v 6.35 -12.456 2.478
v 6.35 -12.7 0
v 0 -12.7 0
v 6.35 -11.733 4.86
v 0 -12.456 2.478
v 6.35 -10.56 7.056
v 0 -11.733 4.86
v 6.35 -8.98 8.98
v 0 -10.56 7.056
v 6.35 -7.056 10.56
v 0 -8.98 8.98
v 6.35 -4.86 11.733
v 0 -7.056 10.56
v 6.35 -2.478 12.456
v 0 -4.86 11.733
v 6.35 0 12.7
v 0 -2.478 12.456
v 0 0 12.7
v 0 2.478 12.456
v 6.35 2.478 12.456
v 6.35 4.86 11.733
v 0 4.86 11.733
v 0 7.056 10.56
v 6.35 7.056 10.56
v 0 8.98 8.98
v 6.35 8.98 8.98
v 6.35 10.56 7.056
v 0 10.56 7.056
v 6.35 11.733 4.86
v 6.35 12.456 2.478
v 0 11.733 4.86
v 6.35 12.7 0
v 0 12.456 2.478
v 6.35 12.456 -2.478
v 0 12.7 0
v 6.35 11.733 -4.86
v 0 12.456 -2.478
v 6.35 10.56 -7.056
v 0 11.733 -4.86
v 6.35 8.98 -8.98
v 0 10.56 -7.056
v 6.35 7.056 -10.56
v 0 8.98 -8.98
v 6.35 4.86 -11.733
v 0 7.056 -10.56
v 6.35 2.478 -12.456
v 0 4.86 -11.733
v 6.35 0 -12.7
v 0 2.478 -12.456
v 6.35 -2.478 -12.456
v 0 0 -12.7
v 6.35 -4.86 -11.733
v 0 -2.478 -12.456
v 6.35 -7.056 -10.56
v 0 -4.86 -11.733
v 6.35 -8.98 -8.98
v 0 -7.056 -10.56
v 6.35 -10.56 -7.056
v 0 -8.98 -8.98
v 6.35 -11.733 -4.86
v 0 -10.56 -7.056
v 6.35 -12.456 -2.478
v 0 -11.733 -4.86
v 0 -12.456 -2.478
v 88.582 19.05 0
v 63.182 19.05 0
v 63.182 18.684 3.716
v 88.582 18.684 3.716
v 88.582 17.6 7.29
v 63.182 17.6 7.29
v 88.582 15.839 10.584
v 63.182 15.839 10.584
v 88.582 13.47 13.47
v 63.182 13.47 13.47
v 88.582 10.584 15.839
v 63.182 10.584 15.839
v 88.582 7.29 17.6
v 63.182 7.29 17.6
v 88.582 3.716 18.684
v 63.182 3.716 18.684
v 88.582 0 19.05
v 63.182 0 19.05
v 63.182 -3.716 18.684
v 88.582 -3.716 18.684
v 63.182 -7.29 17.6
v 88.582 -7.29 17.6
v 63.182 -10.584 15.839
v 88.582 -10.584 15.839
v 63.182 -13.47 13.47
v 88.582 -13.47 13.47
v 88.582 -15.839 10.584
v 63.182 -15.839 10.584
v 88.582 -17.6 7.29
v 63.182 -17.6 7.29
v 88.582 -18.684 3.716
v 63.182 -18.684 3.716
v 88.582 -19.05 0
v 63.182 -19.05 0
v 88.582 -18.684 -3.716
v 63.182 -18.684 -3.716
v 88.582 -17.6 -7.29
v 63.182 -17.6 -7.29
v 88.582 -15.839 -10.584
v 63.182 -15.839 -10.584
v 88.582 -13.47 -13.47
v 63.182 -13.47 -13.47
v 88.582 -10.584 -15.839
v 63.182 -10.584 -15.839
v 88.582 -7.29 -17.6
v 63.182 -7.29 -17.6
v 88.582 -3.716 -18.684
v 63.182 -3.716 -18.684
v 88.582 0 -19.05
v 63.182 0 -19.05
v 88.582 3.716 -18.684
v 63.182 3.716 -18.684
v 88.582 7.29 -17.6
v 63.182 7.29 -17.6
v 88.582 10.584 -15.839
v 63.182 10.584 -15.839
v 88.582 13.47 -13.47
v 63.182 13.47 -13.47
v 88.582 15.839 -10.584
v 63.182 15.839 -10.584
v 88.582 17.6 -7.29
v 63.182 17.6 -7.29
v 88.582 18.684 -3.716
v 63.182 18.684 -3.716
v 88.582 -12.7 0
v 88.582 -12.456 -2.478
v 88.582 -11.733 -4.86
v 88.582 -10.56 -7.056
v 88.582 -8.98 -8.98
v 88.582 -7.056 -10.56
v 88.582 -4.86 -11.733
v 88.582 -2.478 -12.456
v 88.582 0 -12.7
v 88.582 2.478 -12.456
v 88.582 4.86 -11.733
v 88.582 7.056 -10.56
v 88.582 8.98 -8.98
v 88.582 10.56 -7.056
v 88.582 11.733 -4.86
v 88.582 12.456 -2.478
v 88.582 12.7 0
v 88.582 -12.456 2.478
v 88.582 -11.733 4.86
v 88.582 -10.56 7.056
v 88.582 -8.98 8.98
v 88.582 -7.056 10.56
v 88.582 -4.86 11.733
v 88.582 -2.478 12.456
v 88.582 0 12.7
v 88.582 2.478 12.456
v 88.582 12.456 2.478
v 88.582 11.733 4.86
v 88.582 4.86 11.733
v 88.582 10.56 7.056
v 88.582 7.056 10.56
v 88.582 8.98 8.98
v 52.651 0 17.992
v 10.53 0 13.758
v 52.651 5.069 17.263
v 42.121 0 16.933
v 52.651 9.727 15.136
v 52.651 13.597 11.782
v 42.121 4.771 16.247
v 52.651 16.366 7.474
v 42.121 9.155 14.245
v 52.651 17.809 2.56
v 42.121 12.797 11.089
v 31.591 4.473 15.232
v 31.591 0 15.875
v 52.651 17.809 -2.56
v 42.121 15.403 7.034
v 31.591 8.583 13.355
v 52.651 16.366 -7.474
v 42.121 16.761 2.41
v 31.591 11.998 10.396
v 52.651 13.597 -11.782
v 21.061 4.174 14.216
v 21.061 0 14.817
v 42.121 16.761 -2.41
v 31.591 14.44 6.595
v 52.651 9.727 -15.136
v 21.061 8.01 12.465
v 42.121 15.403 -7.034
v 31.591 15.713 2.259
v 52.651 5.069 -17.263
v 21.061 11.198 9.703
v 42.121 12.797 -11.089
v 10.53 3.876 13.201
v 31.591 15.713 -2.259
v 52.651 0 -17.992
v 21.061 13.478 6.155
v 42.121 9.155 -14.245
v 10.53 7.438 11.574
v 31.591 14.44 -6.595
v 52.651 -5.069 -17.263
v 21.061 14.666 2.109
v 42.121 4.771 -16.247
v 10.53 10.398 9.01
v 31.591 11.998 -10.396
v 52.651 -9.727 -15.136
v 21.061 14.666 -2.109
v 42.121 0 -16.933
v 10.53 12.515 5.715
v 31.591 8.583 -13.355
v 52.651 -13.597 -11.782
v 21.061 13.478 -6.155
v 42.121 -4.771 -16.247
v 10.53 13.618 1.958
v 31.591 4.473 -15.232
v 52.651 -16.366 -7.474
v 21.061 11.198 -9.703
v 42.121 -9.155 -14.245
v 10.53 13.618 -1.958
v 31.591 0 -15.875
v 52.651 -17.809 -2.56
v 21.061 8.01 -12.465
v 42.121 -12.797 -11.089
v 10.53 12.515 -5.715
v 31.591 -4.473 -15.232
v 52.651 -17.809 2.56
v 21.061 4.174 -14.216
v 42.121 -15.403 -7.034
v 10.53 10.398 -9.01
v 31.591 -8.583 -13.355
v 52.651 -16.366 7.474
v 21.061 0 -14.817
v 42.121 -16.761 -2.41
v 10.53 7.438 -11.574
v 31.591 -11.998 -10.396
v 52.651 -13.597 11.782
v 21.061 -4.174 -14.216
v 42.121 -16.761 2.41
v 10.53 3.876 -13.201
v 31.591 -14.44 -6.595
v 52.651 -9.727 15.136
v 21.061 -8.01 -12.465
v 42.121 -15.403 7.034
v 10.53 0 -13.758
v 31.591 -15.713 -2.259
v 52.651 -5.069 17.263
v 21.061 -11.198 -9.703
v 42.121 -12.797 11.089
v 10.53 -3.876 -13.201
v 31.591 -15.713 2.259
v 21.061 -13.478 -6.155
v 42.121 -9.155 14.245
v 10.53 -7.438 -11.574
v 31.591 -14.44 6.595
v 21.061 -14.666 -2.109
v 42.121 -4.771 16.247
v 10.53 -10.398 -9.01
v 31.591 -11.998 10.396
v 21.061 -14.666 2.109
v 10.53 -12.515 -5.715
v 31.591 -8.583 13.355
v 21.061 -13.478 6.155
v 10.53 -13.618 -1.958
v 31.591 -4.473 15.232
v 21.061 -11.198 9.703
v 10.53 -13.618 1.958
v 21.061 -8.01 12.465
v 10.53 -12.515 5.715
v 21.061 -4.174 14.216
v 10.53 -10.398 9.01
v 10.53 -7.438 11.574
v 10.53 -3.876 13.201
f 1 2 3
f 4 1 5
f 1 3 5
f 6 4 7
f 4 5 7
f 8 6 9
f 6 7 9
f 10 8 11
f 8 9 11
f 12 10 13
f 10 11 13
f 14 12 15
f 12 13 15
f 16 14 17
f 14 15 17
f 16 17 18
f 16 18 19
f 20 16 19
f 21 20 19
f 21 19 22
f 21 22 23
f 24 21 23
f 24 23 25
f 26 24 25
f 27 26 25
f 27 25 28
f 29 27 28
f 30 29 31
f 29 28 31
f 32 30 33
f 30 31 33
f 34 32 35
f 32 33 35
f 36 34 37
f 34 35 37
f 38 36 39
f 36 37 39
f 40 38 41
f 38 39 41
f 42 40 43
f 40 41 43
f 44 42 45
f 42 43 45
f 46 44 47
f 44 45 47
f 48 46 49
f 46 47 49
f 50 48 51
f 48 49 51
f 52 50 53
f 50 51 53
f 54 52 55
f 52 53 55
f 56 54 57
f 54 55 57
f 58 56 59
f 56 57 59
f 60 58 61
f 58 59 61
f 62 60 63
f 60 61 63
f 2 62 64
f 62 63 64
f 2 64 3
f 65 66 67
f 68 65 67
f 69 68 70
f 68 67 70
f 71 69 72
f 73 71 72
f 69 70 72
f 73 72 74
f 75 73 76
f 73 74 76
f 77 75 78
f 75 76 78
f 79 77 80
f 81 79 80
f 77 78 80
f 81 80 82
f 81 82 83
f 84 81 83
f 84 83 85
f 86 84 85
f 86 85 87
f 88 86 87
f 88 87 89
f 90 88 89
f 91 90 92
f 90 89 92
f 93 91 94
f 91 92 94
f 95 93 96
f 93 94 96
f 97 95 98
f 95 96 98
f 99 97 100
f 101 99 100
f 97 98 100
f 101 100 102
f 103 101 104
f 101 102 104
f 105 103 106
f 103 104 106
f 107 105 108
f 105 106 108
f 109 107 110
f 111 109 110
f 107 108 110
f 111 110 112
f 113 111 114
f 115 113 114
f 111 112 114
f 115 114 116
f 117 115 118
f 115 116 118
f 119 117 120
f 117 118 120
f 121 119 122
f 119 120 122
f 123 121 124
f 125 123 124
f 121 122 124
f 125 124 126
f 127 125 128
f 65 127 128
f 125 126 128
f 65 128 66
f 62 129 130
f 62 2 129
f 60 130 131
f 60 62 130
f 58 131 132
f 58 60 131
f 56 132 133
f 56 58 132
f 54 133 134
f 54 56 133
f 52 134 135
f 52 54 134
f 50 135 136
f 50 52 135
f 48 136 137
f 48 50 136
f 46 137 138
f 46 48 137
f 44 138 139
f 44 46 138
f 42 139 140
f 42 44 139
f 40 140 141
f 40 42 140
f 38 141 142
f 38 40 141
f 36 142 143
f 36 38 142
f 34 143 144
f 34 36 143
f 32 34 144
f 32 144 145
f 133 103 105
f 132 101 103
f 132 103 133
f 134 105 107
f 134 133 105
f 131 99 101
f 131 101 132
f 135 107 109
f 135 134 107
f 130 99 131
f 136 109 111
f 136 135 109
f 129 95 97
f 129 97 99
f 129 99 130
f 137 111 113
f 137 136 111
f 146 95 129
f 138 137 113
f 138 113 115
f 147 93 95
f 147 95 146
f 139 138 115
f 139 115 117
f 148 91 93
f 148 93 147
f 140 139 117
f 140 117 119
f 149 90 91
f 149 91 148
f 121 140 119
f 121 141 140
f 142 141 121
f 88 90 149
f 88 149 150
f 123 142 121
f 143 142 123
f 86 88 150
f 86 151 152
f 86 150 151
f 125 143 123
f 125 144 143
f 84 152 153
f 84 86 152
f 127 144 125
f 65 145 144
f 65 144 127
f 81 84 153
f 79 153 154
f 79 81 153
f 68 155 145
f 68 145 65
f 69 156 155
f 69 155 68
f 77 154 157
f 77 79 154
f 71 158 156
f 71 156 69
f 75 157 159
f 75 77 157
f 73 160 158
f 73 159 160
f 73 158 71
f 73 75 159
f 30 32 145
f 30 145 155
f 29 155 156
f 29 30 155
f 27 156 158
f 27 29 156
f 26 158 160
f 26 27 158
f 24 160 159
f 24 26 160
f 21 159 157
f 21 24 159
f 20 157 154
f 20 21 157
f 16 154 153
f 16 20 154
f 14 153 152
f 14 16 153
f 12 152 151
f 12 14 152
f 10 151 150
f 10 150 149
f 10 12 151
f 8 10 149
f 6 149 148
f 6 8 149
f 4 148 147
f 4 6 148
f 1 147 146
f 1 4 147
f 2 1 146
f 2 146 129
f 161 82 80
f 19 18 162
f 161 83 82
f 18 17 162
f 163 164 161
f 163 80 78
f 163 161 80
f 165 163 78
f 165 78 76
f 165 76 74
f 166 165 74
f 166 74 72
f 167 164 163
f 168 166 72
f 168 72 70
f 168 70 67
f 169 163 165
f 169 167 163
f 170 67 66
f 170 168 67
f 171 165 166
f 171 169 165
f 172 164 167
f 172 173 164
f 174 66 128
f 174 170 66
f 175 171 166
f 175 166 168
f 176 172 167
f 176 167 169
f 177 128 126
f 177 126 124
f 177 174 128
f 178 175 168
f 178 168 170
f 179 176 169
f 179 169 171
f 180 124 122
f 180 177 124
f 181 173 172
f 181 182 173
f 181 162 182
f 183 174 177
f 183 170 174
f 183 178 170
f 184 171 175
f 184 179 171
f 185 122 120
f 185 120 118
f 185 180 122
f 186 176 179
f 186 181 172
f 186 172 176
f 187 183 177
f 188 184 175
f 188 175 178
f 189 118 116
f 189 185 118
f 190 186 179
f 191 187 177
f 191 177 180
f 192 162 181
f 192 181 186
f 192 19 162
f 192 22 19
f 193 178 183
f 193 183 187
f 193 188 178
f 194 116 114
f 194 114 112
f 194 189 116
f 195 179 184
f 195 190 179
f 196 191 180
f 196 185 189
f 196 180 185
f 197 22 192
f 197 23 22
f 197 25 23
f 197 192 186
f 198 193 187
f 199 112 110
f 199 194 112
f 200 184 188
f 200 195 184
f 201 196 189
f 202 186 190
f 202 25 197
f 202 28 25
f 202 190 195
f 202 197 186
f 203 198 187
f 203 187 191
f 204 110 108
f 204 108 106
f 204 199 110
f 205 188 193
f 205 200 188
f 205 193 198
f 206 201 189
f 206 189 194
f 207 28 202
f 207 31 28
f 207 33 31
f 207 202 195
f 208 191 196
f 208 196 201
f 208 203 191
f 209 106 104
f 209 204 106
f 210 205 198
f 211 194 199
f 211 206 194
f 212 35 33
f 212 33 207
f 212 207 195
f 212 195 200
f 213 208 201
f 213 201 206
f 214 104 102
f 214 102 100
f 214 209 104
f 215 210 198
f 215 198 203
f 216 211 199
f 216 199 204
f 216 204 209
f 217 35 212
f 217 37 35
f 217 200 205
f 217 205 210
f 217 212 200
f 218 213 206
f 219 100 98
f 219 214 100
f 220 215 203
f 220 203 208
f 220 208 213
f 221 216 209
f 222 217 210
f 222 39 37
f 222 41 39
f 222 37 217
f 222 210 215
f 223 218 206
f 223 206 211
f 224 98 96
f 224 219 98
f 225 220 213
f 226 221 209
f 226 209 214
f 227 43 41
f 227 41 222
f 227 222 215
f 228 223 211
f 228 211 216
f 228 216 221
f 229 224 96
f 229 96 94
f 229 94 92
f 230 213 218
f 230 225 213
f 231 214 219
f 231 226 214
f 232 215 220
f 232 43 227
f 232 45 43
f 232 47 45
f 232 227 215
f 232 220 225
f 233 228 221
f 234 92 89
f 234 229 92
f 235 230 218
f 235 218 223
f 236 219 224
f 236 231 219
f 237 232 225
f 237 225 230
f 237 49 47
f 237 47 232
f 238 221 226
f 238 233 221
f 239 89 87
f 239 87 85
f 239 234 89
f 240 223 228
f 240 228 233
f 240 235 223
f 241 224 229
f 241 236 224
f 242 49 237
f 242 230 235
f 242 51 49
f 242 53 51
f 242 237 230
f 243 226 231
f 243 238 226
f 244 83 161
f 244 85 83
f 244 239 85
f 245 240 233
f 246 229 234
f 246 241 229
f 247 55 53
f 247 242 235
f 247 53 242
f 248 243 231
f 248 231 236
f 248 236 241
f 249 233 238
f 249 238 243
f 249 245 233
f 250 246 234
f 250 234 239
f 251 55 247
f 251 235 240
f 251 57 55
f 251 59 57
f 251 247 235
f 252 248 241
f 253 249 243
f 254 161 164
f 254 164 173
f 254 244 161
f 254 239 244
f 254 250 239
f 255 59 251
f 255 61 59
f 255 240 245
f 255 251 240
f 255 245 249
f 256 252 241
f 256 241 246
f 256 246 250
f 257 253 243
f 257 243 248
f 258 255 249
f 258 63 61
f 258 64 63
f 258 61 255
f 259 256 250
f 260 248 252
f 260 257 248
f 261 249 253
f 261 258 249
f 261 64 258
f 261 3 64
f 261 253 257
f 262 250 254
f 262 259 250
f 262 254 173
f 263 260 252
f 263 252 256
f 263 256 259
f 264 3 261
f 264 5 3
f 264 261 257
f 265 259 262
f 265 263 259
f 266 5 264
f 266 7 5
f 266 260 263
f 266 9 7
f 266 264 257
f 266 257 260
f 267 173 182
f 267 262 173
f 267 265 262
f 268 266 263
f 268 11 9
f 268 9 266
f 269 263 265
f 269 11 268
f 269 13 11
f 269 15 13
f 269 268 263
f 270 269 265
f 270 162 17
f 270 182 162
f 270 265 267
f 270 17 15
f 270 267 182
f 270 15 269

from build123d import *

# Parameters (mm, degrees)
F2_R     = 19.05
F3_DEPTH = 25.4
F4_T     = -6.35
F6_D     = 25.4
F6_DEPTH = 82.2327022563
F8_D     = 25.4


with BuildPart() as f1:
    # F0 (on Front) → F1 (revolve)
    with BuildSketch(Plane.XZ):
        Polygon((0, 12.7), (0, 0), (63.1817022563, 0), (63.1817022563, 19.05), align=None)
    revolve(axis=Axis((31.5908511281, 0, 0), (-1, 0, 0)))

    # F2 (on face) → F3 (join)
    with BuildSketch(Plane.YZ.offset(63.1817022563)):
        Circle(F2_R)
    extrude(amount=F3_DEPTH)

    # F4
    f4_openings = [f1.faces().sort_by_distance(p)[0] for p in [
        (88.581702, 0, 0),
    ]]
    offset(amount=F4_T, openings=f4_openings)

    # F6 (through all, one way)
    with BuildSketch(Plane(origin=(6.35, 0, 0), x_dir=(0, 1, 0), z_dir=(-1, 0, 0))):
        with Locations((0, 0)):
            Circle(F6_D / 2)
    extrude(amount=-F6_DEPTH, mode=Mode.SUBTRACT)

    # F8 (through all)
    with Locations(Plane.YZ.offset(6.35)):
        with Locations((0, 0)):
            Hole(F8_D / 2)


solid = f1.part
